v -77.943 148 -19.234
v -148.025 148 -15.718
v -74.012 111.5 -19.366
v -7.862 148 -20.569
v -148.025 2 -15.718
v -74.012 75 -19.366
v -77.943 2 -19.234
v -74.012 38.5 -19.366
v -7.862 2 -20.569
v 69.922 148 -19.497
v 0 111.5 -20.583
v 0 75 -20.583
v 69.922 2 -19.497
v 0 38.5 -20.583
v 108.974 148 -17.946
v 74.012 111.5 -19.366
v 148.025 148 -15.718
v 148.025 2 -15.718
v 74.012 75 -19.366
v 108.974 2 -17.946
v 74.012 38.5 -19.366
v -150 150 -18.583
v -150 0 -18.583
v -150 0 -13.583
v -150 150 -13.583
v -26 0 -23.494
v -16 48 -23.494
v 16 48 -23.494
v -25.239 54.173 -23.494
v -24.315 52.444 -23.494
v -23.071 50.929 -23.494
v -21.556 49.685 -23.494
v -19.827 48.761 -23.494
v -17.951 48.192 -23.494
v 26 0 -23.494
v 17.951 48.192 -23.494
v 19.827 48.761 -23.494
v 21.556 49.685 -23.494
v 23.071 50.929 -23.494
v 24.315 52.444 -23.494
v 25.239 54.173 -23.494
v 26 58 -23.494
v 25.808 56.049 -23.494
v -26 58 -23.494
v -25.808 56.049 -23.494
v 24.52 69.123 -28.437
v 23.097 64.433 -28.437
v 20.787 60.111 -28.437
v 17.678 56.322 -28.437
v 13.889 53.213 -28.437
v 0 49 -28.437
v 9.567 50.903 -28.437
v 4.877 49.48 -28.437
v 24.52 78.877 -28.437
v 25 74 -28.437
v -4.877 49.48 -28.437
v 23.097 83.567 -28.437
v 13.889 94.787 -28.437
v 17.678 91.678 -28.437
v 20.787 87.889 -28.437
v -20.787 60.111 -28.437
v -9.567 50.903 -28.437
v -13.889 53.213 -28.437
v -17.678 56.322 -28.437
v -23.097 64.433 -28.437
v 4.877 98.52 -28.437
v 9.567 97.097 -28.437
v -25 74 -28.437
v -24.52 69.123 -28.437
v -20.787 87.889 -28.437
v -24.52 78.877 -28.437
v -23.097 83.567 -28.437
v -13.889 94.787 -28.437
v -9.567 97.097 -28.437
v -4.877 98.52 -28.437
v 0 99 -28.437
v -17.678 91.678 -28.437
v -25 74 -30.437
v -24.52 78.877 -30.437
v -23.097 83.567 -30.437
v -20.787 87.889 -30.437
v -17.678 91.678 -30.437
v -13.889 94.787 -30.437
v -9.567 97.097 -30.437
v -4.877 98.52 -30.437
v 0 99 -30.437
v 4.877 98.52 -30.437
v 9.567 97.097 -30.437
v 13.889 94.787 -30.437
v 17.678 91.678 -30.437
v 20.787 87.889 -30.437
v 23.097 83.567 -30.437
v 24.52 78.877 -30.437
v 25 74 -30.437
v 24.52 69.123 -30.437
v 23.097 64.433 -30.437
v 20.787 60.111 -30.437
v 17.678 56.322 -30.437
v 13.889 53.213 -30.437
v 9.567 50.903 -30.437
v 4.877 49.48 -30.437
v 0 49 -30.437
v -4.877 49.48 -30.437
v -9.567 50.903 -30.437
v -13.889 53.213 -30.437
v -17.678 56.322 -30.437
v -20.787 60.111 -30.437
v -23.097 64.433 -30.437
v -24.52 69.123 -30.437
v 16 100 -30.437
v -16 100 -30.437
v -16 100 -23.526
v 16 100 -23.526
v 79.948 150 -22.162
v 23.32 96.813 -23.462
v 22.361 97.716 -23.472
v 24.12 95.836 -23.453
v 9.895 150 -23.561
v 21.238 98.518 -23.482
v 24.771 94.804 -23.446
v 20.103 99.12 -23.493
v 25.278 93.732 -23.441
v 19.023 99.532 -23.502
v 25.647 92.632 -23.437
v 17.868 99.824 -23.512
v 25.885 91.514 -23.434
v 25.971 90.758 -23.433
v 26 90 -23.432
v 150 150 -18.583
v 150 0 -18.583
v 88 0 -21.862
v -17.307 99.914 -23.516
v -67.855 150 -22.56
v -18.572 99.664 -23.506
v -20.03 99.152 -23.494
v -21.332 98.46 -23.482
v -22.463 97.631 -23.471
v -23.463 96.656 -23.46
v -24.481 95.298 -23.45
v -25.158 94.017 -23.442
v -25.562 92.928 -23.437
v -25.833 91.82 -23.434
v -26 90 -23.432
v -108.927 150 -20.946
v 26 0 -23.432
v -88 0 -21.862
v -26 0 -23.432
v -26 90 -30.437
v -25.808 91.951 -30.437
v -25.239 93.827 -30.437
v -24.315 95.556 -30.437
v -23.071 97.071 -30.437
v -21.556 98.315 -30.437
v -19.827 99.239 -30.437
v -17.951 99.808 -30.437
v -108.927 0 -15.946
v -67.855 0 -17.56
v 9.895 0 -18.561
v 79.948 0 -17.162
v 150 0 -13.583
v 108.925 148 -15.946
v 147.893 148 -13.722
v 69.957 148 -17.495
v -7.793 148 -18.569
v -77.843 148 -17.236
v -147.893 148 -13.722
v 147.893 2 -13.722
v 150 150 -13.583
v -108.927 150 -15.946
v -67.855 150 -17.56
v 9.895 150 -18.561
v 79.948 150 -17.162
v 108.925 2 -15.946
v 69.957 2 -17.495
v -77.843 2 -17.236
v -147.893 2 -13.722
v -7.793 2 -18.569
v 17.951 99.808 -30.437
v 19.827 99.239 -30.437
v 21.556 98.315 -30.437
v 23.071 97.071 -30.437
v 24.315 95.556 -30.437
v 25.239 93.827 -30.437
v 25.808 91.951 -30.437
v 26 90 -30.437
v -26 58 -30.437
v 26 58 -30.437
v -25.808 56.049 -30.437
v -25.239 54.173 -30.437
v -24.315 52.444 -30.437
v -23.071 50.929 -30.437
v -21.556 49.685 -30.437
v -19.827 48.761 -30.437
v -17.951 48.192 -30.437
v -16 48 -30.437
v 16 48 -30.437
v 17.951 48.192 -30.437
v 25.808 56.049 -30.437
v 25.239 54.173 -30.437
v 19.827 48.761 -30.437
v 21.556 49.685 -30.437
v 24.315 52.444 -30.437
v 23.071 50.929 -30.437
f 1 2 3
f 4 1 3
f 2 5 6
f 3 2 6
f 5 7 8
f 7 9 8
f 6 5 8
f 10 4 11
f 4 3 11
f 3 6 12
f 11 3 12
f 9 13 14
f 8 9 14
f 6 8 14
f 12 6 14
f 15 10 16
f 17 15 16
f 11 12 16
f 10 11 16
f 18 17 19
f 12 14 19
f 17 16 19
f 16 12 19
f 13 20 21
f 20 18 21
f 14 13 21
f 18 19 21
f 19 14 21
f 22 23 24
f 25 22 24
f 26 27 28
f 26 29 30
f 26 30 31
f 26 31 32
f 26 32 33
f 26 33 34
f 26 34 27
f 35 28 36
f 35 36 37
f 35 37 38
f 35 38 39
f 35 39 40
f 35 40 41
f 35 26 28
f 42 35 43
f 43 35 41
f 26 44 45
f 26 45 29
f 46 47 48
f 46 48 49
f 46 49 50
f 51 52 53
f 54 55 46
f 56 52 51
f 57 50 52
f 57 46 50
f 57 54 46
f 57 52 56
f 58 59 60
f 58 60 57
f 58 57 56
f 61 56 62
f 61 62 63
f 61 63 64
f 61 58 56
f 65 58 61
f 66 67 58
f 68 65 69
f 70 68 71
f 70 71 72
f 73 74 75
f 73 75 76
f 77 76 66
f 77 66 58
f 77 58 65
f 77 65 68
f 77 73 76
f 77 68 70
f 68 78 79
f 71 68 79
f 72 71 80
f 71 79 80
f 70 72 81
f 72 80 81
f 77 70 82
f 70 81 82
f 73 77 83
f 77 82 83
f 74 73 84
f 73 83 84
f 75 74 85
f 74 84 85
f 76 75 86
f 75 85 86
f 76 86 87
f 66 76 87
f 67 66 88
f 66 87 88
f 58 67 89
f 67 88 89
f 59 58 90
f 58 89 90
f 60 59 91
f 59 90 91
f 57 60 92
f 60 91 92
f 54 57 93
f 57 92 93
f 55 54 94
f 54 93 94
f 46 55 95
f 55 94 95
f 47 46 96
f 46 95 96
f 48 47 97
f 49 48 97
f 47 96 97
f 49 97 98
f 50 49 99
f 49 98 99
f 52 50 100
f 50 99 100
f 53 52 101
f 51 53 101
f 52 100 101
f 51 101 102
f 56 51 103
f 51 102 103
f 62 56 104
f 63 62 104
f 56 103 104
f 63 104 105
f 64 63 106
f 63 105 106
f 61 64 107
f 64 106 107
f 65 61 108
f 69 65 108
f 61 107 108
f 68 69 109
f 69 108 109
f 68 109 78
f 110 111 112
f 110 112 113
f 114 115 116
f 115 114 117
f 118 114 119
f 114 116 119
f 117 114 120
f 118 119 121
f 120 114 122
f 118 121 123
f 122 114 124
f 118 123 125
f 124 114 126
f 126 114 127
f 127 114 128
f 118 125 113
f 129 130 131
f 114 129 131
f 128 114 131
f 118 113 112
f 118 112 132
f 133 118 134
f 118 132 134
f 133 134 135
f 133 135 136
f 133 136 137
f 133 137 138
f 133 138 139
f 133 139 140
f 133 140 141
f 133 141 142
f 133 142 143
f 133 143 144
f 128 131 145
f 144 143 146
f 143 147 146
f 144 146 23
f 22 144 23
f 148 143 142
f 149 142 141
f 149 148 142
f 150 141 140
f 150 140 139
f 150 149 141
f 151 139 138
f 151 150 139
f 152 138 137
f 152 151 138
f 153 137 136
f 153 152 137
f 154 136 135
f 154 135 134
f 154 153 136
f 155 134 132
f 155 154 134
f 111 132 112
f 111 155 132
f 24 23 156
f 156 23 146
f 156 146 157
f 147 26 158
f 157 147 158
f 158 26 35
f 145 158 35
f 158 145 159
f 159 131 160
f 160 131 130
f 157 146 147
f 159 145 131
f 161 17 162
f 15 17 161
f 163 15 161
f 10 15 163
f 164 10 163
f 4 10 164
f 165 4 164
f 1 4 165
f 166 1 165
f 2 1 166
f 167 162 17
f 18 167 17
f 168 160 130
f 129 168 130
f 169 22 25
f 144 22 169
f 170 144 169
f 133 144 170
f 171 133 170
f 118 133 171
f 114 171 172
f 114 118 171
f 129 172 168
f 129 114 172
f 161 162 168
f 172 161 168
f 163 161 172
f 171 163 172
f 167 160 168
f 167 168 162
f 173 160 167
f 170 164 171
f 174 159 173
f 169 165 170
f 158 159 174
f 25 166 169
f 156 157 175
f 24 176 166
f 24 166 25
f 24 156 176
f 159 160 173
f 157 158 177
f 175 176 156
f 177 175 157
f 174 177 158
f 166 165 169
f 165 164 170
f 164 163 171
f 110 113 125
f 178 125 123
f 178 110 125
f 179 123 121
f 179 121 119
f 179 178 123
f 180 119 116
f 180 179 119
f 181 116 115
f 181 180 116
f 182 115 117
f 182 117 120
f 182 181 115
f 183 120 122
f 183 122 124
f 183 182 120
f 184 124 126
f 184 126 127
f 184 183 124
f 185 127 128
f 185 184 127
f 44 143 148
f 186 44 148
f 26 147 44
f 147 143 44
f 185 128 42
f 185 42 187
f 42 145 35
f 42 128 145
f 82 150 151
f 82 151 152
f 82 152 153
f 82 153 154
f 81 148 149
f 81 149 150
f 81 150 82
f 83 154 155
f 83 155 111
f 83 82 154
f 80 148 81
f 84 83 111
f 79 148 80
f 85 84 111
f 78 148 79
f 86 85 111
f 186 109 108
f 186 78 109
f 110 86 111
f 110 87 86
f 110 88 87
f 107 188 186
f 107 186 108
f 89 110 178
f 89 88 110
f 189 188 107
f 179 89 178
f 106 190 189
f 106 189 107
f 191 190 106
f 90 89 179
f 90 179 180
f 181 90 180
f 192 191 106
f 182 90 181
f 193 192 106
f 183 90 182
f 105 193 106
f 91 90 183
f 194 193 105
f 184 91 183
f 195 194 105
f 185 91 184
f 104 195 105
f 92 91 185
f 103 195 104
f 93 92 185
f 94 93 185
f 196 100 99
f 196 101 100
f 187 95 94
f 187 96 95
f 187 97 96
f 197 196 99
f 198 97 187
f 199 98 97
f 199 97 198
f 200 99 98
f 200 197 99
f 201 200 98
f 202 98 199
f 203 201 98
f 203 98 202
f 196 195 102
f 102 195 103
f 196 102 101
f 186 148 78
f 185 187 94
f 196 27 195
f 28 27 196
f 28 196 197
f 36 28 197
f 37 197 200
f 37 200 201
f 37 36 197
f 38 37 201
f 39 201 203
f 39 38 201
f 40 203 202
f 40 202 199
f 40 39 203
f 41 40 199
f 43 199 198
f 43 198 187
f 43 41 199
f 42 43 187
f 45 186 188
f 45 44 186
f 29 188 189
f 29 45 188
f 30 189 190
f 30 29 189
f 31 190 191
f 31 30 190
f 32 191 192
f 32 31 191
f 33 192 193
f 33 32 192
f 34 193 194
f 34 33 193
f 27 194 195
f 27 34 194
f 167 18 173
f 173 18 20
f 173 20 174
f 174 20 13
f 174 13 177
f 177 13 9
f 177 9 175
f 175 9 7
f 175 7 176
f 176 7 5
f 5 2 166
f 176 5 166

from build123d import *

# Parameters (mm, degrees)
BOSS_EXTRUDE1_DEPTH = 150
WRAP1_START         = 2
WRAP1_DEPTH         = 146
SKETCH5_W           = 52
SKETCH5_H           = 7.004650575
BOSS_EXTRUDE2_DEPTH = 100
SKETCH6_W           = 52
SKETCH6_H           = 6.943317242
CUT_EXTRUDE1_DEPTH  = 48
SKETCH7_R           = 25
CUT_EXTRUDE7_DEPTH  = 2
FILLET1_R           = 10


# Read off the part's stored shape, not the designer's step: Wrap1
with BuildPart() as part:
    # Sketch1 → Boss-Extrude1 (new body)
    with BuildSketch(Plane(origin=(0, 0, 0), x_dir=(1, 0, 0), z_dir=(0, 1, 0))):
        with BuildLine():
            Line((150, 13.582690372), (150, 18.582690372))
            add(Edge.make_bspline(
                [(150, 18.582690372), (0, 28.582690372), (-150, 18.582690372)],
                knots=[0, 0, 0, 1, 1, 1], degree=2))
            Line((-150, 18.582690372), (-150, 13.582690372))
            add(Edge.make_bspline(
                [(150, 13.582690372), (0, 23.582690372), (-150, 13.582690372)],
                knots=[0, 0, 0, 1, 1, 1], degree=2))
        make_face()
    extrude(amount=BOSS_EXTRUDE1_DEPTH)

    # Wrap1 outline → Wrap1 (cut)
    with BuildSketch(Plane(origin=(0, 0, 0), x_dir=(1, 0, 0), z_dir=(0, 1, 0)).offset(WRAP1_START)):
        with BuildLine():
            add(Edge.make_bspline(
                [(-148.024677757, 15.717831092), (-74.012620983, 20.582676475), (1e-09, 22.204328649), (74.012620985, 20.582676475), (148.024677759, 15.717831092)],
                knots=[0.007021667, 0.007021667, 0.007021667, 0.007021667, 0.007021667, 0.992978333, 0.992978333, 0.992978333, 0.992978333, 0.992978333], degree=4))
            Line((-148.024677757, 15.717831092), (-147.89349994, 13.722137634))
            add(Edge.make_bspline(
                [(-147.89349994, 13.722137634), (0, 23.443243111), (147.89349994, 13.722137634)],
                knots=[0.007021667, 0.007021667, 0.007021667, 0.992978333, 0.992978333, 0.992978333], degree=2))
            Line((147.89349994, 13.722137634), (148.024677759, 15.717831092))
        make_face()
    extrude(amount=WRAP1_DEPTH, mode=Mode.SUBTRACT)

    # Sketch5 → Boss-Extrude2 (add)
    with BuildSketch(Plane(origin=(0, 0, 0), x_dir=(1, 0, 0), z_dir=(0, 1, 0))):
        with Locations((0, 26.934793438)):
            Rectangle(SKETCH5_W, SKETCH5_H)
    extrude(amount=BOSS_EXTRUDE2_DEPTH)

    # Sketch6 → Cut-Extrude1 (cut)
    with BuildSketch(Plane.XZ):
        with Locations((0, -26.965460104)):
            Rectangle(SKETCH6_W, SKETCH6_H)
    extrude(amount=-CUT_EXTRUDE1_DEPTH, mode=Mode.SUBTRACT)

    # Sketch7 → Cut-Extrude7 (cut)
    with BuildSketch(Plane(origin=(0, 0, -30.437118725), x_dir=(-1, 0, 0), z_dir=(0, 0, -1))):
        with Locations((0, 74)):
            Circle(SKETCH7_R)
    extrude(amount=-CUT_EXTRUDE7_DEPTH, mode=Mode.SUBTRACT)

    # Fillet1
    fillet1_edges = [part.edges().sort_by_distance(p)[0] for p in [
        (-26, 100, -26.934793437),
        (-26, 48, -26.965460104),
        (26, 48, -26.965460104),
        (26, 100, -26.934793437),
    ]]
    fillet(fillet1_edges, radius=FILLET1_R)


solid = part.part
